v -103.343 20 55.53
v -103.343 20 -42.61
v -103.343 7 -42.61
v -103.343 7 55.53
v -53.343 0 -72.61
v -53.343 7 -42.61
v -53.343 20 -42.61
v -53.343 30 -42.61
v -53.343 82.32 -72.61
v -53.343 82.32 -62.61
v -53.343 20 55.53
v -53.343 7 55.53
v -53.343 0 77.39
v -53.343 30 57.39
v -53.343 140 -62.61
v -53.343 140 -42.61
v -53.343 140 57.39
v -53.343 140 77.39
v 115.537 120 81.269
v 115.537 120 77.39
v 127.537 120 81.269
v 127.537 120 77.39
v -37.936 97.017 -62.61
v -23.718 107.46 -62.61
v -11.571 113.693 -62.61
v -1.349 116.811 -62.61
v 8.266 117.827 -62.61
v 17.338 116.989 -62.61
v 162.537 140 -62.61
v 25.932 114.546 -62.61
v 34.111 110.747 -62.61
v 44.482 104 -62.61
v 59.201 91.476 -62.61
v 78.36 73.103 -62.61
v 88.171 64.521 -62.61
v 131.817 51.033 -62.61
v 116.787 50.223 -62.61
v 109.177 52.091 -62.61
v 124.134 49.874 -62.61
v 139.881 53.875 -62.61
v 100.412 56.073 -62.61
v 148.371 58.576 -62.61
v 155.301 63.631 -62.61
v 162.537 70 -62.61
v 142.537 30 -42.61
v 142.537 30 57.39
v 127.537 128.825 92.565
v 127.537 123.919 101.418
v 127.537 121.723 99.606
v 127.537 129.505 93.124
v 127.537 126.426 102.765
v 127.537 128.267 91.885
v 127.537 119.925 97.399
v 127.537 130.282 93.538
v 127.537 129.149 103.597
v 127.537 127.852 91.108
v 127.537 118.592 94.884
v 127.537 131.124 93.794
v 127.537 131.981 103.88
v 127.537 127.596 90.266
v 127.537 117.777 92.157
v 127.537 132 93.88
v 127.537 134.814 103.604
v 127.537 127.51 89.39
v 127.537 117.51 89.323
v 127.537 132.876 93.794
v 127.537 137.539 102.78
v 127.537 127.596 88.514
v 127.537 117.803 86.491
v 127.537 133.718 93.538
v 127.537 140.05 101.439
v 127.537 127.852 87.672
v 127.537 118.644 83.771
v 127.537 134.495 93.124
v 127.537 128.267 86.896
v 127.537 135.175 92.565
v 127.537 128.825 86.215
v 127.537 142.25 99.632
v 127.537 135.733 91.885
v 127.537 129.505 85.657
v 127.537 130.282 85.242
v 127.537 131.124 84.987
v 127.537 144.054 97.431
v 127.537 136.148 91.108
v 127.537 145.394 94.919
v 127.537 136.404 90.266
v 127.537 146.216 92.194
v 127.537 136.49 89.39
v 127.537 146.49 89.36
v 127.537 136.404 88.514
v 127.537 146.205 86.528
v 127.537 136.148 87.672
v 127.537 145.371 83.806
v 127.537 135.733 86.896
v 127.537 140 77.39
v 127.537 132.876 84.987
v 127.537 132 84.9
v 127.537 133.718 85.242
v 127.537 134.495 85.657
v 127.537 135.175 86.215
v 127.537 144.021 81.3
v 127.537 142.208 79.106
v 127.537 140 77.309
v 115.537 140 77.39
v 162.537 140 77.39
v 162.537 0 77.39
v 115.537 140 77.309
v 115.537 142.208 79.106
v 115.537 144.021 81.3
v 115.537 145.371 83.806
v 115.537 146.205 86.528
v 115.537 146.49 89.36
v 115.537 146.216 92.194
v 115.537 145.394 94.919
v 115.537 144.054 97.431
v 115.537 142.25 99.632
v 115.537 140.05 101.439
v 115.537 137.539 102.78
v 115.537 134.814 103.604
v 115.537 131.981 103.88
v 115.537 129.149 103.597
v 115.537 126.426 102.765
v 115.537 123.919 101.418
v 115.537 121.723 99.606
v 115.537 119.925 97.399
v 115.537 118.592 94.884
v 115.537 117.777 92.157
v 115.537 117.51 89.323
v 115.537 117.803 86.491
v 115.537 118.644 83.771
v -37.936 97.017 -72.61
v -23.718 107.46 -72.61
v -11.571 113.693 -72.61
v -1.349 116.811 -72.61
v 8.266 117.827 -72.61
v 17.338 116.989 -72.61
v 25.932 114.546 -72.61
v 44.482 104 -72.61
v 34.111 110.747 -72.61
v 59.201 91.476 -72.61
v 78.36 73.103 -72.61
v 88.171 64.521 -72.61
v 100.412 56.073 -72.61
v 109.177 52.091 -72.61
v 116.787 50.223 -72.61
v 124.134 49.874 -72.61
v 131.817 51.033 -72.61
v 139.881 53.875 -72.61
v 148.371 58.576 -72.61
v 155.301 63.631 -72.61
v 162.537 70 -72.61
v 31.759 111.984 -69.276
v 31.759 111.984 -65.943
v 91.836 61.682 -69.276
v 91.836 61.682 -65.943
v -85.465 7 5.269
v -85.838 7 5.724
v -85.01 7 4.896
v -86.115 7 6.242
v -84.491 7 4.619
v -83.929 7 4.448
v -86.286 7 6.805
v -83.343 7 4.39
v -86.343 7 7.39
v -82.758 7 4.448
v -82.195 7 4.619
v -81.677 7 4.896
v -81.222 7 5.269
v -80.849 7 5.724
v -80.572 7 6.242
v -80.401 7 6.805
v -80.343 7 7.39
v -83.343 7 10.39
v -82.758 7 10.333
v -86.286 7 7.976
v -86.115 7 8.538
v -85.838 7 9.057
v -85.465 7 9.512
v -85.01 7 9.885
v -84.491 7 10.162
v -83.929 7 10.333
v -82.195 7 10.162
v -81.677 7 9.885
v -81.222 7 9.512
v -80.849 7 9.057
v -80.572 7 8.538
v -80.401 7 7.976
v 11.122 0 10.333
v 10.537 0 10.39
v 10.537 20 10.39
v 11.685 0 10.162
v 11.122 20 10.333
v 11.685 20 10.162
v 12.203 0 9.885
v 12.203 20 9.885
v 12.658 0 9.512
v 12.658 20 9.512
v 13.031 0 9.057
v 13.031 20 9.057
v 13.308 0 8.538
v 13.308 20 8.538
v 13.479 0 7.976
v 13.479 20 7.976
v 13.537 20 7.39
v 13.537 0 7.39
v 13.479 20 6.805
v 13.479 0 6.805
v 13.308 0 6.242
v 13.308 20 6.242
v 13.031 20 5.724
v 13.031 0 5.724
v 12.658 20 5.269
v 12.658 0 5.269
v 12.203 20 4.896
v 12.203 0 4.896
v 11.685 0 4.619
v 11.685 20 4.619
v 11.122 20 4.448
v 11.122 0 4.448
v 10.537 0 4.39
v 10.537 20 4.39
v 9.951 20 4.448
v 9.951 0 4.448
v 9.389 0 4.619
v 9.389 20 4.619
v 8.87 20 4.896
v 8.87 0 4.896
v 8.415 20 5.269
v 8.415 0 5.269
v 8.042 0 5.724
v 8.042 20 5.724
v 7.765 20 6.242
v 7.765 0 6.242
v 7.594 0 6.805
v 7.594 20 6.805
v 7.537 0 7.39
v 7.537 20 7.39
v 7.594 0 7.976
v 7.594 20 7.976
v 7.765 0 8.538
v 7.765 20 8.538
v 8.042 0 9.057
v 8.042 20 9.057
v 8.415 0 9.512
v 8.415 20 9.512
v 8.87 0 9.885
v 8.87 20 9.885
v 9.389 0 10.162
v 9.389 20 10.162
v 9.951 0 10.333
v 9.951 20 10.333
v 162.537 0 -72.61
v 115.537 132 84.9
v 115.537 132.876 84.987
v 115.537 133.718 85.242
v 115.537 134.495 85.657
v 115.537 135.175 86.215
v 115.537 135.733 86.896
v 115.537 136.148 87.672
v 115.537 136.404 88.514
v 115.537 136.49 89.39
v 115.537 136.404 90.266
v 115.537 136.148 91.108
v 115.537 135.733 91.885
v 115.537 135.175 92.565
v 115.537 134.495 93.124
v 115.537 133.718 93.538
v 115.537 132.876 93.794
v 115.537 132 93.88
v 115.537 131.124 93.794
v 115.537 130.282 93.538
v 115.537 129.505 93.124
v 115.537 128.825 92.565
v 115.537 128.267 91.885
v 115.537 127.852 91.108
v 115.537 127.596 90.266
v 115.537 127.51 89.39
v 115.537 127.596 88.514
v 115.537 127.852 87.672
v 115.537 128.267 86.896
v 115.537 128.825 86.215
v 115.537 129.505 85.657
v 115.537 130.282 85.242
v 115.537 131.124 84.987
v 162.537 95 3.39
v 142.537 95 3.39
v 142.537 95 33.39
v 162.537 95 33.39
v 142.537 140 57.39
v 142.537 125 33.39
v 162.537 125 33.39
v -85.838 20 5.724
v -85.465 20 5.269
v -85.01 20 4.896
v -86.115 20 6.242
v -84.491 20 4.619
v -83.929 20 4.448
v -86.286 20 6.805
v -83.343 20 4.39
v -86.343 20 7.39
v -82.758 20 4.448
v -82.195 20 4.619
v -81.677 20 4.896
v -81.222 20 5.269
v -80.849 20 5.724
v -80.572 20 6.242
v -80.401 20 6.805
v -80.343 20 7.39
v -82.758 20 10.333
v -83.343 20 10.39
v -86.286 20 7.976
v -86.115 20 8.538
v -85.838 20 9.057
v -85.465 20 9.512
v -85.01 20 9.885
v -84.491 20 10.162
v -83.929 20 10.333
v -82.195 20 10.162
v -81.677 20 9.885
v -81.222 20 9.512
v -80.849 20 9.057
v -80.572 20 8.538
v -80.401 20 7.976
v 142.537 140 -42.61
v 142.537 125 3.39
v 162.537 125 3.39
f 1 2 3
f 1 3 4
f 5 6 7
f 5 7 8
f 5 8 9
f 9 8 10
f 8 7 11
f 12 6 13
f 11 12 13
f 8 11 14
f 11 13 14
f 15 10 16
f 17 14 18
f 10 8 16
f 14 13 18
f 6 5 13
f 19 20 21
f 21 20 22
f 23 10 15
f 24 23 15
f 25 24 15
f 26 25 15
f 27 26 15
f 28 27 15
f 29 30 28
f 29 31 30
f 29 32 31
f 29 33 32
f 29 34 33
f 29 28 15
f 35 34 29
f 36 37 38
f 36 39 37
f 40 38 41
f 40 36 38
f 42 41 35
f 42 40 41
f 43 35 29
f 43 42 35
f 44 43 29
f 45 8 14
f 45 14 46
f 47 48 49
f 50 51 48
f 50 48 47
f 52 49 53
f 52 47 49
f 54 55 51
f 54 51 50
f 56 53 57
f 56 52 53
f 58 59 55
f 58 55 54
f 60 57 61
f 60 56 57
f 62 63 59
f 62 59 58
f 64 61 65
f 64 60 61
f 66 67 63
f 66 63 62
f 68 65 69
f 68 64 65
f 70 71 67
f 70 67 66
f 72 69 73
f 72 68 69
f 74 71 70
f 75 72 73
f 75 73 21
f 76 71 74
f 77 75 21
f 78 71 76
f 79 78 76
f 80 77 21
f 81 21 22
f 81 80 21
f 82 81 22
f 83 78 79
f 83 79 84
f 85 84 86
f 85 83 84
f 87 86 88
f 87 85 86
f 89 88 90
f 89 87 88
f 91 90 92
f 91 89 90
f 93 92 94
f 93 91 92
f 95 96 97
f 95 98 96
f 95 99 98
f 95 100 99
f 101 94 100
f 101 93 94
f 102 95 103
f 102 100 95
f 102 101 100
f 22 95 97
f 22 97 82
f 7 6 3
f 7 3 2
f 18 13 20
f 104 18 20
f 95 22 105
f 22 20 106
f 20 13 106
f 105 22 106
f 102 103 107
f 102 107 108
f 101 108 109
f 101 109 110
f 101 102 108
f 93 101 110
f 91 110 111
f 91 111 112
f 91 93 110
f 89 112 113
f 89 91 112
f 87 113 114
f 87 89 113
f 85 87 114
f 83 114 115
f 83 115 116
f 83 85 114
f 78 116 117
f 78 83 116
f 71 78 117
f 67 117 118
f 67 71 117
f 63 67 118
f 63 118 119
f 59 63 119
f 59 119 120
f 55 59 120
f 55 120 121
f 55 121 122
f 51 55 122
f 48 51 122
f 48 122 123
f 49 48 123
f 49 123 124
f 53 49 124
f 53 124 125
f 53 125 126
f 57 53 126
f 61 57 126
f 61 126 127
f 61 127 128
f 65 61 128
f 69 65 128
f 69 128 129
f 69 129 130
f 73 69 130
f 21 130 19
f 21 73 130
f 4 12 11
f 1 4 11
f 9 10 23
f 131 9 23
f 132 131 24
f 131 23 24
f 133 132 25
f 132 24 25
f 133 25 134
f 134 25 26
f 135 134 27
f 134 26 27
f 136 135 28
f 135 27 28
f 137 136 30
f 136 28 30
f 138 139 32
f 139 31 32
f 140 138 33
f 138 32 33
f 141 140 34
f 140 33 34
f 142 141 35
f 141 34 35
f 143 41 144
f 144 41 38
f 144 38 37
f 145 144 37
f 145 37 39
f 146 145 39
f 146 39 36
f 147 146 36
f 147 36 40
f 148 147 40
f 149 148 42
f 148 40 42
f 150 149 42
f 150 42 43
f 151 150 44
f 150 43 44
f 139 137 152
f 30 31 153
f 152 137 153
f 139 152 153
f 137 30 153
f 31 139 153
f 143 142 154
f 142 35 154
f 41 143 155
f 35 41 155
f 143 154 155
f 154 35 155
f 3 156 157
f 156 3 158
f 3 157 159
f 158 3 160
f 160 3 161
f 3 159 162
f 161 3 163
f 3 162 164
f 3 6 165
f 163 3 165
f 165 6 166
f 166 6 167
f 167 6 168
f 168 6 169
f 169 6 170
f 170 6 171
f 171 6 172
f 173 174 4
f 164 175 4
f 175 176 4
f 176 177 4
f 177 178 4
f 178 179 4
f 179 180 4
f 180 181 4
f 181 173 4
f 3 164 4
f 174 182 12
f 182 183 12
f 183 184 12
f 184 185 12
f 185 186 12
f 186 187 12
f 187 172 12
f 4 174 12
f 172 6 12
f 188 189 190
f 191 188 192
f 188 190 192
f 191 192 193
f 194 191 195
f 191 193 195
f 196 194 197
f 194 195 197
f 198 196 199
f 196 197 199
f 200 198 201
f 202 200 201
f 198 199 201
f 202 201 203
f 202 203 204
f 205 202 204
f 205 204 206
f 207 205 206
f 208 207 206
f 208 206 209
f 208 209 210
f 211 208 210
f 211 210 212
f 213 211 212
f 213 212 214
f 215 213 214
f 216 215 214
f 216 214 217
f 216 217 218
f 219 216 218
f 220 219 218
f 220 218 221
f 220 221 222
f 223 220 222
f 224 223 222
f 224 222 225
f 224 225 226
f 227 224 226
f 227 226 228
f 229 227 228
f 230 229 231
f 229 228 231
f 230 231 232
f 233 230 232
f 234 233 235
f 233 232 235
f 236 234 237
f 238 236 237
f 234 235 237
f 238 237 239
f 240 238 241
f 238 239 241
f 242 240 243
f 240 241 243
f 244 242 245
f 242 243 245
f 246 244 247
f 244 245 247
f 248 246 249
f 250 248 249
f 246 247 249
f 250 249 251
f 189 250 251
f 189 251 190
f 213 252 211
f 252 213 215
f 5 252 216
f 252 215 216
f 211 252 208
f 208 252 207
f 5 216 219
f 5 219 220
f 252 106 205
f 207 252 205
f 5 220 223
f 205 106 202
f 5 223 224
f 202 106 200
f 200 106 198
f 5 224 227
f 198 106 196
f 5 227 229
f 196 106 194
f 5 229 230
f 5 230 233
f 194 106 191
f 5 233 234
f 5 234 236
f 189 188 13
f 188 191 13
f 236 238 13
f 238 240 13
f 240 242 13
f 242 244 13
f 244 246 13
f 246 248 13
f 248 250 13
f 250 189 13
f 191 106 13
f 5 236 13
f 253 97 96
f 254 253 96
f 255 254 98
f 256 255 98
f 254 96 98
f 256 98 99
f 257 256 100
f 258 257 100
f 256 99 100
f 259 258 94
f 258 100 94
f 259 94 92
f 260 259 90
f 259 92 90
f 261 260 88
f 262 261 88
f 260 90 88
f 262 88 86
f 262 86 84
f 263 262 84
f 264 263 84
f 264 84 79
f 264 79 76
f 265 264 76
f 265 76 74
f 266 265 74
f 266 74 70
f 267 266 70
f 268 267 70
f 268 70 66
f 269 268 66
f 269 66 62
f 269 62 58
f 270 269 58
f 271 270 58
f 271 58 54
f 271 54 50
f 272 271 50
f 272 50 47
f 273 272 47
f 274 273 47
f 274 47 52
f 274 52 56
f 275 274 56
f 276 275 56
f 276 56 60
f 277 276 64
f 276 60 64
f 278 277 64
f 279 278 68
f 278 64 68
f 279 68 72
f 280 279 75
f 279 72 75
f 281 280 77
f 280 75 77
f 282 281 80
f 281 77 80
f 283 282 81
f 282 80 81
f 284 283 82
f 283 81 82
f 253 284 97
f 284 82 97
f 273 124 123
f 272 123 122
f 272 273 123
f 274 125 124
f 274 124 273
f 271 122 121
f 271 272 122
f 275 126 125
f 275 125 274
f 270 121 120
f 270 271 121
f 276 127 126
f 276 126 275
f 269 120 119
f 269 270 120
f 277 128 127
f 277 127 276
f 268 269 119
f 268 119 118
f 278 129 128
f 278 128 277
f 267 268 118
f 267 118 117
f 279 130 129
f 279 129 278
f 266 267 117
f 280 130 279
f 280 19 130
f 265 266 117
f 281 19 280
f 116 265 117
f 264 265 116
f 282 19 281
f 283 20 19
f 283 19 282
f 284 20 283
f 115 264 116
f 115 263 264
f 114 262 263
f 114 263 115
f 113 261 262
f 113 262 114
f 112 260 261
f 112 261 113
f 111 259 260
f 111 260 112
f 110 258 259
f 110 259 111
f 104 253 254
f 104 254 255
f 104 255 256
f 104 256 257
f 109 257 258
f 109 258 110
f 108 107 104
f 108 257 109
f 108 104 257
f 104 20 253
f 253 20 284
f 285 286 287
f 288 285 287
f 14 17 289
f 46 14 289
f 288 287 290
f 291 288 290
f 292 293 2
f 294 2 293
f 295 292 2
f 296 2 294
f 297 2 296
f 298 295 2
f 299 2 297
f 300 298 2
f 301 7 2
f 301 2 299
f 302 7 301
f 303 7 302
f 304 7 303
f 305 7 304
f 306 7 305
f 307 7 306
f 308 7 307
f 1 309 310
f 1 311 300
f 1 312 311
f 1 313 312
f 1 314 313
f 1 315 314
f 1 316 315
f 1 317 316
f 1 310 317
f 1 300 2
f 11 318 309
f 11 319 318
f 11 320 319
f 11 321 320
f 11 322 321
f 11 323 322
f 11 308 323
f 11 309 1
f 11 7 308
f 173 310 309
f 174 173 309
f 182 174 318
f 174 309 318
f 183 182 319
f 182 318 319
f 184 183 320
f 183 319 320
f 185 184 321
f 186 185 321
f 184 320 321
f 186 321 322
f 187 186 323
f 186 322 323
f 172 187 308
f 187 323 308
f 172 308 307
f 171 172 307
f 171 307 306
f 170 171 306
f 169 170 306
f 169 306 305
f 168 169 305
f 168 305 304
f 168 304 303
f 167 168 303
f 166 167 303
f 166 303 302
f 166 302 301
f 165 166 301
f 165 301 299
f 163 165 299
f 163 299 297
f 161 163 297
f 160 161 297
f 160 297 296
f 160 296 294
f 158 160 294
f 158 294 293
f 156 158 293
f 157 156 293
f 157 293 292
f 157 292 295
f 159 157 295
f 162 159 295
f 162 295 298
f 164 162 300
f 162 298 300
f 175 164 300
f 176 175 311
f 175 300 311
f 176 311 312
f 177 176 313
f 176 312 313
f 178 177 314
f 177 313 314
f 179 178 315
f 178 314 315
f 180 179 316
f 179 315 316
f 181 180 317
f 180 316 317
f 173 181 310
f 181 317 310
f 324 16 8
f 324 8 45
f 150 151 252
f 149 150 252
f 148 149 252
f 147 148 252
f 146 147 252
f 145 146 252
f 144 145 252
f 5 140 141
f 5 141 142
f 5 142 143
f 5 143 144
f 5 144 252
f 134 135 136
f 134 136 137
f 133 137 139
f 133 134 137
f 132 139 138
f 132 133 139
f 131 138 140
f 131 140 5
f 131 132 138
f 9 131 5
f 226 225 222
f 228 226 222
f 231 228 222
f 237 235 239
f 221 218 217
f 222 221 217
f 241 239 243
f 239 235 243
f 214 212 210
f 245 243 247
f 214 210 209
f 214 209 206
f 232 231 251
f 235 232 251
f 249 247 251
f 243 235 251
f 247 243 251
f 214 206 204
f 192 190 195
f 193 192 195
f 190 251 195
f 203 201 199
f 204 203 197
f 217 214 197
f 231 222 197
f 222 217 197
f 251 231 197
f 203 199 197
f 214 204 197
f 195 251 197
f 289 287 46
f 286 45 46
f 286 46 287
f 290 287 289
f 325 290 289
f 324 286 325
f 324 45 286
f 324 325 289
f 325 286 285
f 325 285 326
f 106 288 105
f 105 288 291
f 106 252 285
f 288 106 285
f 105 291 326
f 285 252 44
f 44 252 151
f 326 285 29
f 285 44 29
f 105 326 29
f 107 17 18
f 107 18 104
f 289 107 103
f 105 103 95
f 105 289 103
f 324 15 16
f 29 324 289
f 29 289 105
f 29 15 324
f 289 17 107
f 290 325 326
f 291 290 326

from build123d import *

# Parameters (mm, degrees)
SKETCH_1_W           = 365.88
SKETCH_1_H           = 140
EXTRUDE_1_DEPTH      = 140
SKETCH_2_W           = 345.88
SKETCH_2_H           = 100
CUT_EXTRUDE_1_DEPTH  = 110
SKETCH_8_W           = 12
SKETCH_8_H           = 12
EXTRUDE_2_DEPTH      = 10
SKETCH_9_R           = 14.49
SKETCH_9_R_2         = 4.49
EXTRUDE_1_2_DEPTH    = 12
SKETCH_11_R          = 4.49
CUT_EXTRUDE_5_DEPTH  = 377.473106042
SKETCH_13_W          = 150
SKETCH_13_H          = 140
CUT_EXTRUDE_7_DEPTH  = 268.84258315
SKETCH_14_W          = 98.139384751
SKETCH_14_H          = 13
EXTRUDE_3_DEPTH      = 50
SKETCH_15_R          = 3
CUT_EXTRUDE_8_DEPTH  = 231.670688982
EXTRUDE_4_DEPTH      = 10
SKETCH_22_W          = 30
SKETCH_22_H          = 45
CUT_EXTRUDE_9_DEPTH  = 305.478898404
SKETCH_26_W          = 20
SKETCH_26_H          = 15
EXTRUDE_6_DEPTH      = 40
SKETCH_30_R          = 3
CUT_EXTRUDE_10_DEPTH = 231.670689053


with BuildPart() as part:
    # 草圖1 → Extrude 1 (new body)
    with BuildSketch(Plane(origin=(0, 0, 0), x_dir=(1, 0, 0), z_dir=(0, 1, 0))):
        with Locations((-20.403414634, -7.390243902)):
            Rectangle(SKETCH_1_W, SKETCH_1_H)
    extrude(amount=EXTRUDE_1_DEPTH)

    # 草圖2 → 除料-伸長1 (cut)
    with BuildSketch(Plane(origin=(0, 140, 0), x_dir=(1, 0, 0), z_dir=(0, 1, 0))):
        with Locations((-30.403414634, -7.390243902)):
            Rectangle(SKETCH_2_W, SKETCH_2_H)
    extrude(amount=-CUT_EXTRUDE_1_DEPTH, mode=Mode.SUBTRACT)

    # 草圖8 → 填料-伸長2 (add)
    with BuildSketch(Plane.XY.offset(77.390243902)):
        with Locations((121.536585366, 126)):
            Rectangle(SKETCH_8_W, SKETCH_8_H)
    extrude(amount=EXTRUDE_2_DEPTH)

    # 草圖9 → Extrude 1 2 (add)
    with BuildSketch(Plane(origin=(127.536585366, 0, 0), x_dir=(0, 0, -1), z_dir=(1, 0, 0))):
        with Locations((-89.390243902, 132)):
            Circle(SKETCH_9_R)
        with Locations((-89.390243902, 132)):
            Circle(SKETCH_9_R_2, mode=Mode.SUBTRACT)
    extrude(amount=-EXTRUDE_1_2_DEPTH)

    # 草圖11 → 除料-伸長5 (cut, through all)
    with BuildSketch(Plane(origin=(127.536585366, 0, 0), x_dir=(0, 0, -1), z_dir=(1, 0, 0))):
        with Locations((-89.390243902, 132)):
            Circle(SKETCH_11_R)
    extrude(amount=-CUT_EXTRUDE_5_DEPTH, mode=Mode.SUBTRACT)

    # 草圖13 → 除料-伸長7 (cut, through all)
    with BuildSketch(Plane(origin=(0, 140, 0), x_dir=(1, 0, 0), z_dir=(0, 1, 0))):
        with Locations((-128.343414634, -7.390243902)):
            Rectangle(SKETCH_13_W, SKETCH_13_H)
    extrude(amount=-CUT_EXTRUDE_7_DEPTH, mode=Mode.SUBTRACT)

    # 草圖14 → 填料-伸長3 (add)
    with BuildSketch(Plane.ZY.offset(53.343414634)):
        with Locations((6.459936277, 13.5)):
            Rectangle(SKETCH_14_W, SKETCH_14_H)
    extrude(amount=EXTRUDE_3_DEPTH)

    # 草圖15 → 除料-伸長8 (cut, through all)
    with BuildSketch(Plane(origin=(0, 20, 0), x_dir=(1, 0, 0), z_dir=(0, 1, 0))):
        with Locations(Location((10.536585366, -7.390243902, 0), (0, 0, 270))):
            Circle(SKETCH_15_R)
    extrude(amount=-CUT_EXTRUDE_8_DEPTH, mode=Mode.SUBTRACT)

    # 草圖16 → 填料-伸長4 (add)
    with BuildSketch(Plane(origin=(0, 0, -62.609756098), x_dir=(-1, 0, 0), z_dir=(0, 0, -1))):
        with BuildLine():
            Line((-162.536585366, 70), (-162.536585366, 0))
            Line((-162.536585366, 0), (53.343414634, 0))
            Line((53.343414634, 0), (53.343414634, 82.32))
            add(Edge.make_bspline(
                [(53.343414634, 82.32), (-56.153144995, 198.160876335), (-74.64229081, -13.821841175), (-162.536585366, 70)],
                knots=[0, 0, 0, 0, 1, 1, 1, 1], degree=3))
        make_face()
    extrude(amount=EXTRUDE_4_DEPTH)

    # 草圖22 → 除料-伸長9 (cut, through all)
    with BuildSketch(Plane.ZY.offset(-142.536585366)):
        with Locations((18.390243902, 117.5)):
            Rectangle(SKETCH_22_W, SKETCH_22_H)
    extrude(amount=-CUT_EXTRUDE_9_DEPTH, mode=Mode.SUBTRACT)

    # 草圖26 → 填料-伸長6 (add)
    with BuildSketch(Plane.XY.offset(3.390243902)):
        with Locations((152.536585366, 132.5)):
            Rectangle(SKETCH_26_W, SKETCH_26_H)
    extrude(amount=EXTRUDE_6_DEPTH)

    # 草圖30 → 除料-伸長10 (cut, through all)
    with BuildSketch(Plane(origin=(0, 20, 0), x_dir=(1, 0, 0), z_dir=(0, 1, 0))):
        with Locations(Location((-83.343414634, -7.390243902, 0), (0, 0, 270))):
            Circle(SKETCH_30_R)
    extrude(amount=-CUT_EXTRUDE_10_DEPTH, mode=Mode.SUBTRACT)


solid = part.part
